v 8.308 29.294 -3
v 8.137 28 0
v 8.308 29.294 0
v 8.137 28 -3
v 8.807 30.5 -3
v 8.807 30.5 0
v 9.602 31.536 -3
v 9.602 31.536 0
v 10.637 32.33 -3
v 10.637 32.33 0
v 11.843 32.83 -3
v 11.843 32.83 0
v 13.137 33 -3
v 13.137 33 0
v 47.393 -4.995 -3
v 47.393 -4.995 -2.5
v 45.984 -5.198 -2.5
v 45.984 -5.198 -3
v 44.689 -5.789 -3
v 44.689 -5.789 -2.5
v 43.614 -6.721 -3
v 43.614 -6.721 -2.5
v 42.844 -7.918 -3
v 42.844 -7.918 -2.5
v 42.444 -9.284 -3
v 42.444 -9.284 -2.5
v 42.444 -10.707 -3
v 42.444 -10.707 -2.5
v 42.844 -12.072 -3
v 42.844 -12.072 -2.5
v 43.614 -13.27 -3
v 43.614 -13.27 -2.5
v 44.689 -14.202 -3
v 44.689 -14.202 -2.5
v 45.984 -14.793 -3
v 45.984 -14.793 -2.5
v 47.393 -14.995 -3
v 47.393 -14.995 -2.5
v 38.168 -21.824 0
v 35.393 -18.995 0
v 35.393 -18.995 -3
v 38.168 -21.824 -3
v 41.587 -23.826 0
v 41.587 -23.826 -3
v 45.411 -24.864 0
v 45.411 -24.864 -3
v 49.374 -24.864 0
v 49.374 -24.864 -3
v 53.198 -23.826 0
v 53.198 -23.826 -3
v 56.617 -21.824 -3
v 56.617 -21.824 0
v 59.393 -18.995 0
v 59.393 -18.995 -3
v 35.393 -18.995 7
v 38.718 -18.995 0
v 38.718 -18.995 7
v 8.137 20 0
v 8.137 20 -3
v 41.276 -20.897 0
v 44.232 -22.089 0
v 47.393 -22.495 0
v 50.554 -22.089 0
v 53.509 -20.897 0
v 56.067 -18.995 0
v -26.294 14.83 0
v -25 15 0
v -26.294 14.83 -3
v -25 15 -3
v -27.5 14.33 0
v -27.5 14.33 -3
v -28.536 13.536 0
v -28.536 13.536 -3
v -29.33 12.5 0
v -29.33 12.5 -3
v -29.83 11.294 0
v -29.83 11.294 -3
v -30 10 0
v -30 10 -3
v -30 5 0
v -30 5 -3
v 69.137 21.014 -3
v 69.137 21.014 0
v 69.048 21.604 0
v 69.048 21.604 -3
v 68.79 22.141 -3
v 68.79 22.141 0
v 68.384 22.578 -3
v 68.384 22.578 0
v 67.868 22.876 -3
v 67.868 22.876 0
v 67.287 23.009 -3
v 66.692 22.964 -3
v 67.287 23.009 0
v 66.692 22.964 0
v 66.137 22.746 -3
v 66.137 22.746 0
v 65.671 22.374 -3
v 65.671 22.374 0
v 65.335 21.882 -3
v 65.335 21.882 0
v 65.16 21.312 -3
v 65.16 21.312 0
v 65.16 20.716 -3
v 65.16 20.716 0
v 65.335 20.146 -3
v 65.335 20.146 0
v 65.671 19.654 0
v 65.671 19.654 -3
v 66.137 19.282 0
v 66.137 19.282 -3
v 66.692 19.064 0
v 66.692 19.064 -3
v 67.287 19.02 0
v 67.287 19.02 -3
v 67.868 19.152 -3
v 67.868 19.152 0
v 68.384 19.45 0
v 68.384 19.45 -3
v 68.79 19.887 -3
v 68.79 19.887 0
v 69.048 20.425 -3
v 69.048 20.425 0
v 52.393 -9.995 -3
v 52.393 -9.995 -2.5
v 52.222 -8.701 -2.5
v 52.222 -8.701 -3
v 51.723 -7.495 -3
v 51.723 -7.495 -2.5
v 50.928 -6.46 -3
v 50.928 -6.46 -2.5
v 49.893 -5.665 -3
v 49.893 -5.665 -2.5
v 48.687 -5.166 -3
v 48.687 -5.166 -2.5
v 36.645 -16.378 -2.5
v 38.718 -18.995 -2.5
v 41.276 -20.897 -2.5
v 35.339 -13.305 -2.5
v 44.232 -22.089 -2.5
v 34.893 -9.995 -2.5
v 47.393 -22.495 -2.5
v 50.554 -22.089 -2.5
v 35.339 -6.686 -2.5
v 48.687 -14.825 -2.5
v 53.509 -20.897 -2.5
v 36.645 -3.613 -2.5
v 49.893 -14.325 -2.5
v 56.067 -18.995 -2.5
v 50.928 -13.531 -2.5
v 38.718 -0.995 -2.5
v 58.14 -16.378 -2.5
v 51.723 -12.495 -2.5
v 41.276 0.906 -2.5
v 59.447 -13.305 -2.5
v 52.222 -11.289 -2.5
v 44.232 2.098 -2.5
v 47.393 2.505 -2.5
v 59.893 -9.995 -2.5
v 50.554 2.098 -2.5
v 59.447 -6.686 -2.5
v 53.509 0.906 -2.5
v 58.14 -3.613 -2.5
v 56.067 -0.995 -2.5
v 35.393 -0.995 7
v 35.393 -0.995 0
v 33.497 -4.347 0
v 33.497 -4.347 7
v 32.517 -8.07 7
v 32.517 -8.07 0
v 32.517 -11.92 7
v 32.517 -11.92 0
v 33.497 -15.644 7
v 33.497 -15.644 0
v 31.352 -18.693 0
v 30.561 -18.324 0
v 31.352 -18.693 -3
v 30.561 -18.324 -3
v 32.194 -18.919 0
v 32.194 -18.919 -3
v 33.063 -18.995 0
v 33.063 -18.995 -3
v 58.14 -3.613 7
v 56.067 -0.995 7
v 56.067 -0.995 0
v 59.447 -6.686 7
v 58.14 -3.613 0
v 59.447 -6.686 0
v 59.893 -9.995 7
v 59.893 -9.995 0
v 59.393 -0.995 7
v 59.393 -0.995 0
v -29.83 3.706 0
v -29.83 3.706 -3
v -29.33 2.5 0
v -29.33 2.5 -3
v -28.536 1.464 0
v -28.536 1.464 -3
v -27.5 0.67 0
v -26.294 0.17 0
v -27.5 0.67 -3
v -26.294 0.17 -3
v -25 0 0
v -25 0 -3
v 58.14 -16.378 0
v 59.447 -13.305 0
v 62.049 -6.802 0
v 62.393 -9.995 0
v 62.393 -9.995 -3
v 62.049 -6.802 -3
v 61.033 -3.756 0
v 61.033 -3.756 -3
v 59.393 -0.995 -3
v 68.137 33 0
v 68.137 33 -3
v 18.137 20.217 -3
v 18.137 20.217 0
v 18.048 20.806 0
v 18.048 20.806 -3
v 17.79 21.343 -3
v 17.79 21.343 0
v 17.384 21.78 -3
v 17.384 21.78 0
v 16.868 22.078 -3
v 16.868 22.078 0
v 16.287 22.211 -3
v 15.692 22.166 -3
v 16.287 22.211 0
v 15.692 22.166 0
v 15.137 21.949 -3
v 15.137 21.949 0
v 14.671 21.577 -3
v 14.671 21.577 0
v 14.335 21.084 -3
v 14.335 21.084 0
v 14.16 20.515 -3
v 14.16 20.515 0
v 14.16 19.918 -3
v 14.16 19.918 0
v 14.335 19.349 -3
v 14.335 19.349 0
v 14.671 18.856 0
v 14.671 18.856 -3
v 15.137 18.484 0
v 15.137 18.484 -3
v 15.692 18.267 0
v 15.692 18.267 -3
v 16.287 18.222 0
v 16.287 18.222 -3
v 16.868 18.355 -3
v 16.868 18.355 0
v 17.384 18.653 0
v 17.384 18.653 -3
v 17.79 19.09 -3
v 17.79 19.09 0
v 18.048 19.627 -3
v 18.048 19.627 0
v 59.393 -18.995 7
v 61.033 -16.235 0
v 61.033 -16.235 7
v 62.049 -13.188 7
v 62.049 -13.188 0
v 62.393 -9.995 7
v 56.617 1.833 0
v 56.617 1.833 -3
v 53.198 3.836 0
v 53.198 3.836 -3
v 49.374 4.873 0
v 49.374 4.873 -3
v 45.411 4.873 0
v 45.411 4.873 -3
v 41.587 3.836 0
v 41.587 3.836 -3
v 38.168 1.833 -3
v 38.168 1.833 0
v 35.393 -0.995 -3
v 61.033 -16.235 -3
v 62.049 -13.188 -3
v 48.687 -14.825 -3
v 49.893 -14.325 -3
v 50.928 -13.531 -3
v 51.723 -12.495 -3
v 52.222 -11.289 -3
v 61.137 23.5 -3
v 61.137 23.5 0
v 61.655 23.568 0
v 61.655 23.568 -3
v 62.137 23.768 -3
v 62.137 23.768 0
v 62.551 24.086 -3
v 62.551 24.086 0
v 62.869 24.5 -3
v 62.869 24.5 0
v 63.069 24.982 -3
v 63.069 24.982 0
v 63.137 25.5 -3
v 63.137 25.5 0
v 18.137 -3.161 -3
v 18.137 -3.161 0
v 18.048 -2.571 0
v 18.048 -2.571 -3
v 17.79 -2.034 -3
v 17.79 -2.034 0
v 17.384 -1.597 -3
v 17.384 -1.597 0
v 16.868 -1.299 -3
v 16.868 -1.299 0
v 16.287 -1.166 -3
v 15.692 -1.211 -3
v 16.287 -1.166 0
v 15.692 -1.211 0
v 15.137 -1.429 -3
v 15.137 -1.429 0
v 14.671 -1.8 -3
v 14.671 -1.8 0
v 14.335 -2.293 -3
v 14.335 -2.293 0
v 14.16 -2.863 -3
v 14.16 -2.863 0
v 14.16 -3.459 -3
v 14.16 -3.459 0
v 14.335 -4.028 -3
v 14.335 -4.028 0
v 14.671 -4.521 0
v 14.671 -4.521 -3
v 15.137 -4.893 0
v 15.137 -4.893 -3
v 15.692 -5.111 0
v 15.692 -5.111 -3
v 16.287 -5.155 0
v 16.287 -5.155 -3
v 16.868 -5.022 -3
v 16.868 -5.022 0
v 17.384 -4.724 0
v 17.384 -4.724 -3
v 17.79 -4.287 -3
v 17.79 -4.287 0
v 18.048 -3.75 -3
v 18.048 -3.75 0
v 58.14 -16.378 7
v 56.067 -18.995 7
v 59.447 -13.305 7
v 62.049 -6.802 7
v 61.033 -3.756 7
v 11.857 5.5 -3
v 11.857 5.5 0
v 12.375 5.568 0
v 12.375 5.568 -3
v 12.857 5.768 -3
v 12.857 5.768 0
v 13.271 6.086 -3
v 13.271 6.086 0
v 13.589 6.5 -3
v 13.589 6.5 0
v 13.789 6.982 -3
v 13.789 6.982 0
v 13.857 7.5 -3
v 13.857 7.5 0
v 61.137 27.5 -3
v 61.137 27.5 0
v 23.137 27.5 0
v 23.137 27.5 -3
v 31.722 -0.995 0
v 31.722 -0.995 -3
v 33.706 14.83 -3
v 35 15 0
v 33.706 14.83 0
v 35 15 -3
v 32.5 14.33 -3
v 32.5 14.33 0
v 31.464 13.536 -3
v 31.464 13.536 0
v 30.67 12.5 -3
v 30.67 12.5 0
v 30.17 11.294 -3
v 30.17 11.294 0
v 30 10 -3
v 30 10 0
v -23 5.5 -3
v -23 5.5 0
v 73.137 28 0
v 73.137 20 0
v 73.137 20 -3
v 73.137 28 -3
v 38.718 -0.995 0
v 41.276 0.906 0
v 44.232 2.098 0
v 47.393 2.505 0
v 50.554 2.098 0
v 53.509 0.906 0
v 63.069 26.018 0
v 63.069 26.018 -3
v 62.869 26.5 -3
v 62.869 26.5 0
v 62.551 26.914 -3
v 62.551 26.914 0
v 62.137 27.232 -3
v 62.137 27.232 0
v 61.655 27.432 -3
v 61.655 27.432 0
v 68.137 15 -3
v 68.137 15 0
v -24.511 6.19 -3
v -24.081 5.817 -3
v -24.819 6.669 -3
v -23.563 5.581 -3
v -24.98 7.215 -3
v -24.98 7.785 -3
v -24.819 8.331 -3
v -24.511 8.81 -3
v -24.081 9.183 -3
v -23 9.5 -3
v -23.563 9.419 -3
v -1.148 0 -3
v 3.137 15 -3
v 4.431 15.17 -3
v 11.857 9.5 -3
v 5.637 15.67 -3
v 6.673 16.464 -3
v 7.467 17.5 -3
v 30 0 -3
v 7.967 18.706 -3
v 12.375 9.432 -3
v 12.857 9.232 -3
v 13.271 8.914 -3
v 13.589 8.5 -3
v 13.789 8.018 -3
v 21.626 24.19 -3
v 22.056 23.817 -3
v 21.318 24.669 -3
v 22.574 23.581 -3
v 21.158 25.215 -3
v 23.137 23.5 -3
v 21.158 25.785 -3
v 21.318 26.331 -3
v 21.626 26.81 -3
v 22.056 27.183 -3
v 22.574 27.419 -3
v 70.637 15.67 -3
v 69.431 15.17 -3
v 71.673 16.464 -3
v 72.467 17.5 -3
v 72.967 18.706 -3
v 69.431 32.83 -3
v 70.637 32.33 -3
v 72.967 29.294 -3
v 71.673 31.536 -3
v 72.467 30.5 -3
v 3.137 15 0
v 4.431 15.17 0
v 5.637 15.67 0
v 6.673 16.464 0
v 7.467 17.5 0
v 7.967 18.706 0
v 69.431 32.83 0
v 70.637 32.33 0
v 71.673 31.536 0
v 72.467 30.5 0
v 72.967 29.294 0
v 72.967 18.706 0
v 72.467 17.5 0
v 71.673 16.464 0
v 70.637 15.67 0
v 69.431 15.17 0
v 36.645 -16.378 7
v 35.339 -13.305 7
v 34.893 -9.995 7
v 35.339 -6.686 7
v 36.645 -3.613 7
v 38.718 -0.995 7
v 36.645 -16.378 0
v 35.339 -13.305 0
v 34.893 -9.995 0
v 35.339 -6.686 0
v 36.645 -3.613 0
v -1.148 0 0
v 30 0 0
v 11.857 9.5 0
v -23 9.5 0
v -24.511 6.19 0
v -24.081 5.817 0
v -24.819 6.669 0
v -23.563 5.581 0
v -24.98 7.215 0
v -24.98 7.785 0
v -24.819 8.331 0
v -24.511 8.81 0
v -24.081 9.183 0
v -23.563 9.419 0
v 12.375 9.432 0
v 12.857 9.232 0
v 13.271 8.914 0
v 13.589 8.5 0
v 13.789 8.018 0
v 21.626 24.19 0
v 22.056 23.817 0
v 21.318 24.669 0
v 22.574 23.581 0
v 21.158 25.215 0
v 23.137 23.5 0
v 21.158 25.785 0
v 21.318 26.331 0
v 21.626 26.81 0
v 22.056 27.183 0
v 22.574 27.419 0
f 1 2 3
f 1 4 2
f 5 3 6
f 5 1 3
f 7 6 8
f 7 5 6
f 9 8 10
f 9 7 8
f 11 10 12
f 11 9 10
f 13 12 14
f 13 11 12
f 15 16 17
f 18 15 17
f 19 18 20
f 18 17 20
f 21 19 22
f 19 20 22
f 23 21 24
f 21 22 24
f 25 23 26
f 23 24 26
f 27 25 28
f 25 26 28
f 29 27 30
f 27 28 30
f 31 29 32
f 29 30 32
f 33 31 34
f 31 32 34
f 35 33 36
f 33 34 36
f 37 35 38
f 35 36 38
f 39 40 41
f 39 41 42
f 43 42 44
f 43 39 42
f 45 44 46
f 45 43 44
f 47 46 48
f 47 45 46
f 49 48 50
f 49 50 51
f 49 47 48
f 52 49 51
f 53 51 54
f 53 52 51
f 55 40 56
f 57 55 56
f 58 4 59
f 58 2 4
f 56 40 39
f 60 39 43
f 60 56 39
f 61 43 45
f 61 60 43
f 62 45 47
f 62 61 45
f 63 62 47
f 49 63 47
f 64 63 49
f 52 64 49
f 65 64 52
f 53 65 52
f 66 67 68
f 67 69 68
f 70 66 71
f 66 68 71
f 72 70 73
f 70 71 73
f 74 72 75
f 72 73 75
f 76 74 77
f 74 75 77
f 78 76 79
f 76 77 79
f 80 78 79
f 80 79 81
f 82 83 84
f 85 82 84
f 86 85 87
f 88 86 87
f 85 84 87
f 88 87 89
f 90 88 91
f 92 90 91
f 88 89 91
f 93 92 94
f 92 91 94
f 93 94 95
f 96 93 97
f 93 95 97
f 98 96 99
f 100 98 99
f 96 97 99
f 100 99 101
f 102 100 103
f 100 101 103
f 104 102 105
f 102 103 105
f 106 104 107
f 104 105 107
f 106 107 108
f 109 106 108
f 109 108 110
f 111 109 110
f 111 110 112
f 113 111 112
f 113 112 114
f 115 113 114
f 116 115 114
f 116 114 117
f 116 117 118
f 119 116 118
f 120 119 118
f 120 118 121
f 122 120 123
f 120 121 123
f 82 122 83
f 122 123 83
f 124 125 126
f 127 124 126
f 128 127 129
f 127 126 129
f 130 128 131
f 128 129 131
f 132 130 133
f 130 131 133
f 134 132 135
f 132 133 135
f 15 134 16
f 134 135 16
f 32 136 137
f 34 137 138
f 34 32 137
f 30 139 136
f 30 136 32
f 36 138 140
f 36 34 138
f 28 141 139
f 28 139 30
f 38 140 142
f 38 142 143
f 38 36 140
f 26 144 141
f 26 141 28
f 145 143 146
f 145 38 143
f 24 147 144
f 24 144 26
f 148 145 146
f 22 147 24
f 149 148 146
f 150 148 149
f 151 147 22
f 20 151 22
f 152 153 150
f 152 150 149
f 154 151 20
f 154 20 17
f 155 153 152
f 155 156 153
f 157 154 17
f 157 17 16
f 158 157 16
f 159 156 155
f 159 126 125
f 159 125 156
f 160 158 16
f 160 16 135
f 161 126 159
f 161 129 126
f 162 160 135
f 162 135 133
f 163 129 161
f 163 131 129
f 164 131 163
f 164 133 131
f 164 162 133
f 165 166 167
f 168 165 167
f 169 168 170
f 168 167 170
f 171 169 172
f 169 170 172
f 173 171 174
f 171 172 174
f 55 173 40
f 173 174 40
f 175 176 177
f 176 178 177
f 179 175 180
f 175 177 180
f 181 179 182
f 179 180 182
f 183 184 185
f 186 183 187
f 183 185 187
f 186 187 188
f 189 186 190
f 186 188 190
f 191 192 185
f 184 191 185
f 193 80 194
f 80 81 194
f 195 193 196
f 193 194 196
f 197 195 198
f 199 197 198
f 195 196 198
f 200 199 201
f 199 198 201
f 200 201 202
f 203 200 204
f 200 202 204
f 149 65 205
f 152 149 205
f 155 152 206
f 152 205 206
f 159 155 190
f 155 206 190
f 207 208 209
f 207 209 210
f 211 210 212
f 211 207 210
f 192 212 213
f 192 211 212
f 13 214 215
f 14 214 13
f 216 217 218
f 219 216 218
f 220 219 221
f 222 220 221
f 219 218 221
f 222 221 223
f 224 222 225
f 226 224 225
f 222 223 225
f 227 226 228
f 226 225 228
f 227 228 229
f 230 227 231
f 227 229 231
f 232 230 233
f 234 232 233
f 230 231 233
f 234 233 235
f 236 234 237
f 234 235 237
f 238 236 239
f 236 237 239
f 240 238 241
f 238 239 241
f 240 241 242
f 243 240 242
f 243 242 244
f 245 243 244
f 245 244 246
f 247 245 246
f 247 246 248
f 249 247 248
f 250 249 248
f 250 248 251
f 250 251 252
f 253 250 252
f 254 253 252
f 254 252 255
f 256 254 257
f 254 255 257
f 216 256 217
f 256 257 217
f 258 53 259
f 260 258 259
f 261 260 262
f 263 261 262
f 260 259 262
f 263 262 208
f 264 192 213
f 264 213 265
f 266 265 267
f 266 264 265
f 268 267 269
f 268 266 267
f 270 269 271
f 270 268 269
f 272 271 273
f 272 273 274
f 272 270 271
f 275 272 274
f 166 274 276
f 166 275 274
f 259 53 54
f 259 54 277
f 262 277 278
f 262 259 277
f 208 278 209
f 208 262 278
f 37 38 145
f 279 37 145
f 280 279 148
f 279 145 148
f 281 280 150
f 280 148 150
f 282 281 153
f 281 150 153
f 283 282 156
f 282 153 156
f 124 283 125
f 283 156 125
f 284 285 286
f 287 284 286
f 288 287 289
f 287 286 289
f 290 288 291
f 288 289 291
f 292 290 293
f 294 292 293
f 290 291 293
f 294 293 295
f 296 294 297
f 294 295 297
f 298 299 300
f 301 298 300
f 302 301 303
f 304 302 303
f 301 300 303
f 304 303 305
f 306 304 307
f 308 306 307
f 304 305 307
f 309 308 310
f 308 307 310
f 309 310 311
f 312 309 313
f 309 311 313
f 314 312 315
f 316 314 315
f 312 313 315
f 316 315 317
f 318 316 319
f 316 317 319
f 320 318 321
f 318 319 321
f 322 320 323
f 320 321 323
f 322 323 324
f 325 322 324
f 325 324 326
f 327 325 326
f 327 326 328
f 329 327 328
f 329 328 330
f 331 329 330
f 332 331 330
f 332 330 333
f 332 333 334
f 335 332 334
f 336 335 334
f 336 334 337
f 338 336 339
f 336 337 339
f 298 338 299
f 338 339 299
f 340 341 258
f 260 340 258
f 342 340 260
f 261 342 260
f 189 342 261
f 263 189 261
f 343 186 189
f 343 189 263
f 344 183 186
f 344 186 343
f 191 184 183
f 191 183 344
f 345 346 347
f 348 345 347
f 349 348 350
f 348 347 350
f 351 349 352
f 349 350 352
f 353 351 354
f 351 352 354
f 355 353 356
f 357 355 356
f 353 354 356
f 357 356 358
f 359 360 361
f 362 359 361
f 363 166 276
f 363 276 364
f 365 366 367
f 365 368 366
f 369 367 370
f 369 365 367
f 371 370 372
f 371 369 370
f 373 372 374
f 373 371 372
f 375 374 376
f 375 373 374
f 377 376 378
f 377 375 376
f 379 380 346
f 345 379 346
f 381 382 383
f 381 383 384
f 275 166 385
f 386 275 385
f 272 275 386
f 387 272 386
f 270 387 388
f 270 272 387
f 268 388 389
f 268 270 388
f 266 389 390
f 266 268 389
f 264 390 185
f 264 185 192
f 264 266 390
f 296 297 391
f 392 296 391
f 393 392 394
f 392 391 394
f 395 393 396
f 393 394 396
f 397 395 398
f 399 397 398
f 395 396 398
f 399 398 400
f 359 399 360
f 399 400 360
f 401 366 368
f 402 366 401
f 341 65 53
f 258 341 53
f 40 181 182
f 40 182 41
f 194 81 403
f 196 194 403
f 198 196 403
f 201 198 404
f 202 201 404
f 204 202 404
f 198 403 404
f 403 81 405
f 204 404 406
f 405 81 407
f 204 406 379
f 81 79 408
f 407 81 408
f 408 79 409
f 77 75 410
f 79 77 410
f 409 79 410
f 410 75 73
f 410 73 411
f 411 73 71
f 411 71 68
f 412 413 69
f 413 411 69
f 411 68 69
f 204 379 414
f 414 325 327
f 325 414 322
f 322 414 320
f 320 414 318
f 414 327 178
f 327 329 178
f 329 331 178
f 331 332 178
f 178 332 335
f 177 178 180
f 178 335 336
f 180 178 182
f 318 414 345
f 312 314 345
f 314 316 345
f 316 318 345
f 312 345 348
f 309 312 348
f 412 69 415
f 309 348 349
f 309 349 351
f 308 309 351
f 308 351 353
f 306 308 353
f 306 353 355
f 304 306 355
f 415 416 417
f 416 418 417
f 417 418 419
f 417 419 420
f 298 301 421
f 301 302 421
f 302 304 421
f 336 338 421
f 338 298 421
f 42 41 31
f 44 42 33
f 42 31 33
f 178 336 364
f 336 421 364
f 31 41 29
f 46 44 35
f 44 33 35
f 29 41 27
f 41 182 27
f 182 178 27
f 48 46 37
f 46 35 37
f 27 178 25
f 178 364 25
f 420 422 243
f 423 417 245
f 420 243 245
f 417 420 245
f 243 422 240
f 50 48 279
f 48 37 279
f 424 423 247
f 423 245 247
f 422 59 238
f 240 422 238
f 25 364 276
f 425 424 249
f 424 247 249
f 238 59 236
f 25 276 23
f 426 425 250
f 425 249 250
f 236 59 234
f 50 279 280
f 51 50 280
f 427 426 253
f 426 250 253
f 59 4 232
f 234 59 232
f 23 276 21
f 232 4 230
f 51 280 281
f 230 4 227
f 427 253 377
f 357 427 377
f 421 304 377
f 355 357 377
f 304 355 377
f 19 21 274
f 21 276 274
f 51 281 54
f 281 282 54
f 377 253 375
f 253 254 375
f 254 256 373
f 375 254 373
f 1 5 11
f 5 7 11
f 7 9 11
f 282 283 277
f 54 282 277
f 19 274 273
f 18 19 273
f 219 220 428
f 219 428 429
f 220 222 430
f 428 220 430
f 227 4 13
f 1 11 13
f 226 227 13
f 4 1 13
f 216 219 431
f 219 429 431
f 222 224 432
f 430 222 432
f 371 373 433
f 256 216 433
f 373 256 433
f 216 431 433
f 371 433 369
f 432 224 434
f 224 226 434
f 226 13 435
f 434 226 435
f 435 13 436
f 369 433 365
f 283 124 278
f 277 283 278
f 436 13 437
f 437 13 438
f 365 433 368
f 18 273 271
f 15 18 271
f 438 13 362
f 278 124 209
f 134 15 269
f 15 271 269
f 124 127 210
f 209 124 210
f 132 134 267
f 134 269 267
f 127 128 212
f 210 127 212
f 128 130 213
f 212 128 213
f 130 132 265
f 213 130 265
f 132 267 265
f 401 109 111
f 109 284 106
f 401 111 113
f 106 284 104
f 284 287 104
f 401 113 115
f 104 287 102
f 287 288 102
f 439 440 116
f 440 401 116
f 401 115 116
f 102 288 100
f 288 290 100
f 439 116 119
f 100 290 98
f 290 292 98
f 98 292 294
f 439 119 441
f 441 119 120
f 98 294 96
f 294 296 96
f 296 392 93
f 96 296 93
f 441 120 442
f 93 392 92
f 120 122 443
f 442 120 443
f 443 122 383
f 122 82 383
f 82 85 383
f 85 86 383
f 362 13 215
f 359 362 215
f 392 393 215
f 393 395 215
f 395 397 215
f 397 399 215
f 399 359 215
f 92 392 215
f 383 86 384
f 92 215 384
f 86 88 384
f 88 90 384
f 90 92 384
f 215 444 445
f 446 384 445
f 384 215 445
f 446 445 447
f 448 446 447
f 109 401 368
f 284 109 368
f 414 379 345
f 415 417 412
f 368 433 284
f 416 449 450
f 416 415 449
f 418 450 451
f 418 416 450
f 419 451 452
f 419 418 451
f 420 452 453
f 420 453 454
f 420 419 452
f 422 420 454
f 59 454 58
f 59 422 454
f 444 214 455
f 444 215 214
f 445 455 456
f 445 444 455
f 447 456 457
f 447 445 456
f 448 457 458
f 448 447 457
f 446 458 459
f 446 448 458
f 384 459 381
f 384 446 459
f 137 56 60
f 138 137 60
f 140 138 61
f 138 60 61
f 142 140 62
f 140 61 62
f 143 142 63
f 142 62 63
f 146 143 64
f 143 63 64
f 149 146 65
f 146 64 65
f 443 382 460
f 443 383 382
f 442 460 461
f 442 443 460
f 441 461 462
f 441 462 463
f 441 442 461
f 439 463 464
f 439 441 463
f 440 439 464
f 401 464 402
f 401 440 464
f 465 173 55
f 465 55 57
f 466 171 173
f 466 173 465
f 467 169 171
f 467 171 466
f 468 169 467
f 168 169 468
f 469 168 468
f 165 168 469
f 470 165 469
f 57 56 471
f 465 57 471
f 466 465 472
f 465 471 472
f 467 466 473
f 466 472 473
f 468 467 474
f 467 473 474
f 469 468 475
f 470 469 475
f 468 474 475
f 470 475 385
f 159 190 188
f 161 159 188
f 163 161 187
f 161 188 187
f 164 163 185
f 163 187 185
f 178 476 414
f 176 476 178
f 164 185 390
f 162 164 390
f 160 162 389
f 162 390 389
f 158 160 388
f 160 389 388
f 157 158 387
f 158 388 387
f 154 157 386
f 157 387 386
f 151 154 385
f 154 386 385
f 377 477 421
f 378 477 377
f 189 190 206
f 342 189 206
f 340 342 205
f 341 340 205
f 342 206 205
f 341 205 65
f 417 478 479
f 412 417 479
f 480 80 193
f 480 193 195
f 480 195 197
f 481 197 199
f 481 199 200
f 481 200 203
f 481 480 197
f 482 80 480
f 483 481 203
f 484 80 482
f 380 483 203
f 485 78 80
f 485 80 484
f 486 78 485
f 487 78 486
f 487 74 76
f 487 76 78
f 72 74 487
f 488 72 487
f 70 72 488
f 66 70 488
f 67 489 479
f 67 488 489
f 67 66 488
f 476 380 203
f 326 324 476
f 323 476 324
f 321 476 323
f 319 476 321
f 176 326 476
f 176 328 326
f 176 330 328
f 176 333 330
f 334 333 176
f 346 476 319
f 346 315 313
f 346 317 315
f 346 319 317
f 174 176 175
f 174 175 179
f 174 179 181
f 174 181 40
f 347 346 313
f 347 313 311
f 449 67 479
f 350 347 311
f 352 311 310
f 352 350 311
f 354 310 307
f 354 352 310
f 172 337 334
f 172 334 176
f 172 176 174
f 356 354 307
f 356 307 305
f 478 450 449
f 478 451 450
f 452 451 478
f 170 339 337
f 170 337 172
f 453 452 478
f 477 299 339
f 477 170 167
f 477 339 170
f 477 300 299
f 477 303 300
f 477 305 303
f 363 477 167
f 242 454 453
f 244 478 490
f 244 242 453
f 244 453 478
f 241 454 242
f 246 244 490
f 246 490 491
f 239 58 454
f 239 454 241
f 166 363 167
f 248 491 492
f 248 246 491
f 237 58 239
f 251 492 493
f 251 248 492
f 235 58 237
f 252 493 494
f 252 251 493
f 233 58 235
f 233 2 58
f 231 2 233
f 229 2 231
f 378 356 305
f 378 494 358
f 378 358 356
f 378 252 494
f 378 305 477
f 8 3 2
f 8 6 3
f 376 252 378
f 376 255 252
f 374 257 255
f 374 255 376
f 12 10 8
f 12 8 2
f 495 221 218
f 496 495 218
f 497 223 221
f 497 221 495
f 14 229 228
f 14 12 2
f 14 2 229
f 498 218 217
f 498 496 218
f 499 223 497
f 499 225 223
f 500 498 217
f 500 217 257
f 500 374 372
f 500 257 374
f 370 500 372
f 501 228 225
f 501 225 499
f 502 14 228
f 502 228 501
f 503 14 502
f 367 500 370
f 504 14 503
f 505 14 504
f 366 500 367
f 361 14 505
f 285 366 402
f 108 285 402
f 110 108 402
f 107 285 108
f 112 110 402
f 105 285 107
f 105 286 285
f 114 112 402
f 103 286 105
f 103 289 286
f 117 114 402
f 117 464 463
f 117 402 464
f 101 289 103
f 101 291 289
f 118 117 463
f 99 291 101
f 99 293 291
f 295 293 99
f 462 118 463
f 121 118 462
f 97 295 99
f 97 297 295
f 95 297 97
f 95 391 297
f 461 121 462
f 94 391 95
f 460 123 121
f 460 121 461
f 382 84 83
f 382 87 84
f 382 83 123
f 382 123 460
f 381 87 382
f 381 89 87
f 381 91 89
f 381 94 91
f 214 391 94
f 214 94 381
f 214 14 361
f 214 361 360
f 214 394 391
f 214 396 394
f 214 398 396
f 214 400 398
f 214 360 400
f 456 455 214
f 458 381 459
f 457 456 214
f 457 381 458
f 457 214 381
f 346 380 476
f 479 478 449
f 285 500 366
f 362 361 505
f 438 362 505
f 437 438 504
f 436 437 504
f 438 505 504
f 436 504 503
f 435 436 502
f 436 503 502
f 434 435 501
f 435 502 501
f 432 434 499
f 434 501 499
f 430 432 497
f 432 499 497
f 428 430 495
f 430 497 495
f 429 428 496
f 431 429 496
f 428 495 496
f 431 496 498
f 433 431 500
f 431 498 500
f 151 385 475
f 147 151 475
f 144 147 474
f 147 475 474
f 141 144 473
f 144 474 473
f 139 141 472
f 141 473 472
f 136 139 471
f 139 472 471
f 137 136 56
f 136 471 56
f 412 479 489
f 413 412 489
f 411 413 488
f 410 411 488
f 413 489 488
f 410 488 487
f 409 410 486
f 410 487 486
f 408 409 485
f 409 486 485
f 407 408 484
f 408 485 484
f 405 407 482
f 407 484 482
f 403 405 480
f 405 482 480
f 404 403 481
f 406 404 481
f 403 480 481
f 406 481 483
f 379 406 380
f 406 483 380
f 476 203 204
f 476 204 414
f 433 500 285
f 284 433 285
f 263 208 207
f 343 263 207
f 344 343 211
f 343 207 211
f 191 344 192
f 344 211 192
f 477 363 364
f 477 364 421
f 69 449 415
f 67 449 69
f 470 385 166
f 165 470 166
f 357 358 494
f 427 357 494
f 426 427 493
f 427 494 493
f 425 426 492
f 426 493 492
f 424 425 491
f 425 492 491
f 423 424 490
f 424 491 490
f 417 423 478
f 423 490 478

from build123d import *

# Parameters (mm, degrees)
F0_R     = 2
F0_W     = 21.8627425395
F0_H     = 3
F2_DEPTH = 3
F3_DEPTH = 2.5
F4_DEPTH = 3.001
F5_DEPTH = 3
F6_R     = 5
F7_DEPTH = 7


with BuildPart() as f2:
    # F0 (on Top) → F2 (new body)
    with BuildSketch(Plane.XY):
        Polygon((8.1372574605, 15), (-30, 15), (-30, 0), (-1.1483471663, 0), (30, 0), (30, 15), align=None)
        with BuildLine():
            ThreePointArc((-23, 5.5), (-25, 7.5), (-23, 9.5))
            Line((-23, 9.5), (11.8569275364, 9.5))
            ThreePointArc((11.8569275364, 9.5), (13.2711410988, 8.9142135624), (13.8569275364, 7.5))
            ThreePointArc((13.8569275364, 7.5), (13.2711410988, 6.0857864376), (11.8569275364, 5.5))
            Line((11.8569275364, 5.5), (-23, 5.5))
        make_face(mode=Mode.SUBTRACT)
        Polygon((30, 0), (-1.1483471663, 0), (31.7223609335, -18.9953175569), (31.7223609335, -0.9953175569), align=None)
        with Locations((16.1372574605, -3.1607300043)):
            Circle(F0_R, mode=Mode.SUBTRACT)
        with BuildLine():
            Line((8.1372574605, 33), (8.1372574605, 18))
            Line((8.1372574605, 18), (30, 18))
            Line((30, 18), (40.6372574605, 18))
            Line((40.6372574605, 18), (40.6372574605, 23.5))
            Line((40.6372574605, 23.5), (23.1372574605, 23.5))
            ThreePointArc((23.1372574605, 23.5), (21.1372574605, 25.5), (23.1372574605, 27.5))
            Line((23.1372574605, 27.5), (40.6372574605, 27.5))
            Line((40.6372574605, 27.5), (40.6372574605, 33))
            Line((40.6372574605, 33), (8.1372574605, 33))
        make_face()
        with Locations((16.1372574605, 20.216524601)):
            Circle(F0_R, mode=Mode.SUBTRACT)
        with BuildLine():
            Line((40.6372574605, 23.5), (40.6372574605, 18))
            Line((40.6372574605, 18), (73.1372574605, 18))
            Line((73.1372574605, 18), (73.1372574605, 33))
            Line((73.1372574605, 33), (40.6372574605, 33))
            Line((40.6372574605, 33), (40.6372574605, 27.5))
            Line((40.6372574605, 27.5), (61.1372574605, 27.5))
            ThreePointArc((61.1372574605, 27.5), (62.5514710229, 26.9142135624), (63.1372574605, 25.5))
            ThreePointArc((63.1372574605, 25.5), (62.5514710229, 24.0857864376), (61.1372574605, 23.5))
            Line((61.1372574605, 23.5), (40.6372574605, 23.5))
        make_face()
        with Locations((67.1372574605, 21.0141353309)):
            Circle(F0_R, mode=Mode.SUBTRACT)
        with Locations((19.0686287303, 16.5)):
            Rectangle(F0_W, F0_H)
        with BuildLine():
            Line((31.7223609335, -0.9953175569), (31.7223609335, -18.9953175569))
            Line((31.7223609335, -18.9953175569), (35.3926290005, -18.9953175569))
            ThreePointArc((35.3926290005, -18.9953175569), (32.3926290005, -9.9953175569), (35.3926290005, -0.9953175569))
            Line((35.3926290005, -0.9953175569), (31.7223609335, -0.9953175569))
        make_face()
        with BuildLine():
            ThreePointArc((35.3926290005, -0.9953175569), (32.3926290005, -9.9953175569), (35.3926290005, -18.9953175569))
            Line((35.3926290005, -18.9953175569), (38.717953214, -18.9953175569))
            ThreePointArc((38.717953214, -18.9953175569), (34.8926290005, -9.9953175569), (38.717953214, -0.9953175569))
            Line((38.717953214, -0.9953175569), (35.3926290005, -0.9953175569))
        make_face()
        with BuildLine():
            ThreePointArc((38.717953214, -0.9953175569), (34.8926290005, -9.9953175569), (38.717953214, -18.9953175569))
            Line((38.717953214, -18.9953175569), (47.3926290005, -18.9953175569))
            Line((47.3926290005, -18.9953175569), (47.3926290005, -0.9953175569))
            Line((47.3926290005, -0.9953175569), (38.717953214, -0.9953175569))
        make_face()
        with BuildLine():
            ThreePointArc((56.0673047869, -0.9953175569), (47.3926290005, 2.5046824431), (38.717953214, -0.9953175569))
            Line((38.717953214, -0.9953175569), (47.3926290005, -0.9953175569))
            Line((47.3926290005, -0.9953175569), (56.0673047869, -0.9953175569))
        make_face()
        with BuildLine():
            Line((47.3926290005, -18.9953175569), (56.0673047869, -18.9953175569))
            ThreePointArc((56.0673047869, -18.9953175569), (58.8966162947, -14.8849265734), (59.8926290005, -9.9953175569))
            ThreePointArc((59.8926290005, -9.9953175569), (58.8966162947, -5.1057085403), (56.0673047869, -0.9953175569))
            Line((56.0673047869, -0.9953175569), (47.3926290005, -0.9953175569))
            Line((47.3926290005, -0.9953175569), (47.3926290005, -18.9953175569))
        make_face()
        with BuildLine():
            Line((56.0673047869, -18.9953175569), (59.3926290005, -18.9953175569))
            ThreePointArc((59.3926290005, -18.9953175569), (61.6228784712, -14.7387340471), (62.3926290005, -9.9953175569))
            ThreePointArc((62.3926290005, -9.9953175569), (61.6228784712, -5.2519010666), (59.3926290005, -0.9953175569))
            Line((59.3926290005, -0.9953175569), (56.0673047869, -0.9953175569))
            ThreePointArc((56.0673047869, -0.9953175569), (58.8966162947, -5.1057085403), (59.8926290005, -9.9953175569))
            ThreePointArc((59.8926290005, -9.9953175569), (58.8966162947, -14.8849265734), (56.0673047869, -18.9953175569))
        make_face()
        with BuildLine():
            Line((38.717953214, -18.9953175569), (35.3926290005, -18.9953175569))
            ThreePointArc((35.3926290005, -18.9953175569), (47.3926290005, -24.9953175569), (59.3926290005, -18.9953175569))
            Line((59.3926290005, -18.9953175569), (56.0673047869, -18.9953175569))
            ThreePointArc((56.0673047869, -18.9953175569), (47.3926290005, -22.4953175569), (38.717953214, -18.9953175569))
        make_face()
        with BuildLine():
            Line((47.3926290005, -18.9953175569), (38.717953214, -18.9953175569))
            ThreePointArc((38.717953214, -18.9953175569), (47.3926290005, -22.4953175569), (56.0673047869, -18.9953175569))
            Line((56.0673047869, -18.9953175569), (47.3926290005, -18.9953175569))
        make_face()
        with BuildLine():
            ThreePointArc((59.3926290005, -0.9953175569), (47.3926290005, 5.0046824431), (35.3926290005, -0.9953175569))
            Line((35.3926290005, -0.9953175569), (38.717953214, -0.9953175569))
            ThreePointArc((38.717953214, -0.9953175569), (47.3926290005, 2.5046824431), (56.0673047869, -0.9953175569))
            Line((56.0673047869, -0.9953175569), (59.3926290005, -0.9953175569))
        make_face()
        with BuildLine():
            ThreePointArc((-23, 9.5), (-21.5857864376, 8.9142135624), (-21, 7.5))
            ThreePointArc((-21, 7.5), (-21.5857864376, 6.0857864376), (-23, 5.5))
            Line((-23, 5.5), (11.8569275364, 5.5))
            ThreePointArc((11.8569275364, 5.5), (9.8569275364, 7.5), (11.8569275364, 9.5))
            Line((11.8569275364, 9.5), (-23, 9.5))
        make_face()
        with BuildLine():
            Line((11.8569275364, 7.5), (11.8569275364, 9.5))
            ThreePointArc((11.8569275364, 9.5), (9.8569275364, 7.5), (11.8569275364, 5.5))
            Line((11.8569275364, 5.5), (11.8569275364, 7.5))
        make_face()
        with BuildLine():
            ThreePointArc((13.8569275364, 7.5), (13.2711410988, 8.9142135624), (11.8569275364, 9.5))
            Line((11.8569275364, 9.5), (11.8569275364, 7.5))
            Line((11.8569275364, 7.5), (11.8569275364, 5.5))
            ThreePointArc((11.8569275364, 5.5), (13.2711410988, 6.0857864376), (13.8569275364, 7.5))
        make_face()
        with BuildLine():
            Line((-23, 7.5), (-23, 9.5))
            ThreePointArc((-23, 9.5), (-25, 7.5), (-23, 5.5))
            Line((-23, 5.5), (-23, 7.5))
        make_face()
        with BuildLine():
            ThreePointArc((-23, 5.5), (-21.5857864376, 6.0857864376), (-21, 7.5))
            ThreePointArc((-21, 7.5), (-21.5857864376, 8.9142135624), (-23, 9.5))
            Line((-23, 9.5), (-23, 7.5))
            Line((-23, 7.5), (-23, 5.5))
        make_face()
        with BuildLine():
            ThreePointArc((23.1372574605, 27.5), (21.1372574605, 25.5), (23.1372574605, 23.5))
            Line((23.1372574605, 23.5), (23.1372574605, 25.5))
            Line((23.1372574605, 25.5), (23.1372574605, 27.5))
        make_face()
        with BuildLine():
            Line((23.1372574605, 25.5), (23.1372574605, 23.5))
            ThreePointArc((23.1372574605, 23.5), (24.5514710229, 24.0857864376), (25.1372574605, 25.5))
            ThreePointArc((25.1372574605, 25.5), (24.5514710229, 26.9142135624), (23.1372574605, 27.5))
            Line((23.1372574605, 27.5), (23.1372574605, 25.5))
        make_face()
        with BuildLine():
            Line((23.1372574605, 23.5), (40.6372574605, 23.5))
            Line((40.6372574605, 23.5), (40.6372574605, 25.5))
            Line((40.6372574605, 25.5), (40.6372574605, 27.5))
            Line((40.6372574605, 27.5), (23.1372574605, 27.5))
            ThreePointArc((23.1372574605, 27.5), (24.5514710229, 26.9142135624), (25.1372574605, 25.5))
            ThreePointArc((25.1372574605, 25.5), (24.5514710229, 24.0857864376), (23.1372574605, 23.5))
        make_face()
        with BuildLine():
            Line((40.6372574605, 25.5), (40.6372574605, 23.5))
            Line((40.6372574605, 23.5), (61.1372574605, 23.5))
            ThreePointArc((61.1372574605, 23.5), (59.1372574605, 25.5), (61.1372574605, 27.5))
            Line((61.1372574605, 27.5), (40.6372574605, 27.5))
            Line((40.6372574605, 27.5), (40.6372574605, 25.5))
        make_face()
        with BuildLine():
            ThreePointArc((61.1372574605, 27.5), (59.1372574605, 25.5), (61.1372574605, 23.5))
            Line((61.1372574605, 23.5), (61.1372574605, 25.5))
            Line((61.1372574605, 25.5), (61.1372574605, 27.5))
        make_face()
        with BuildLine():
            Line((61.1372574605, 25.5), (61.1372574605, 23.5))
            ThreePointArc((61.1372574605, 23.5), (62.5514710229, 24.0857864376), (63.1372574605, 25.5))
            ThreePointArc((63.1372574605, 25.5), (62.5514710229, 26.9142135624), (61.1372574605, 27.5))
            Line((61.1372574605, 27.5), (61.1372574605, 25.5))
        make_face()
        Polygon((30, 18), (30, 15), (73.1372574605, 15), (73.1372574605, 18), (40.6372574605, 18), align=None)
    extrude(amount=-F2_DEPTH)

    # F0 (on Top) → F3 (cut)
    with BuildSketch(Plane.XY):
        with BuildLine():
            ThreePointArc((56.0673047869, -0.9953175569), (47.3926290005, 2.5046824431), (38.717953214, -0.9953175569))
            Line((38.717953214, -0.9953175569), (47.3926290005, -0.9953175569))
            Line((47.3926290005, -0.9953175569), (56.0673047869, -0.9953175569))
        make_face()
        with BuildLine():
            ThreePointArc((38.717953214, -0.9953175569), (34.8926290005, -9.9953175569), (38.717953214, -18.9953175569))
            Line((38.717953214, -18.9953175569), (47.3926290005, -18.9953175569))
            Line((47.3926290005, -18.9953175569), (47.3926290005, -0.9953175569))
            Line((47.3926290005, -0.9953175569), (38.717953214, -0.9953175569))
        make_face()
        with BuildLine():
            Line((47.3926290005, -18.9953175569), (56.0673047869, -18.9953175569))
            ThreePointArc((56.0673047869, -18.9953175569), (58.8966162947, -14.8849265734), (59.8926290005, -9.9953175569))
            ThreePointArc((59.8926290005, -9.9953175569), (58.8966162947, -5.1057085403), (56.0673047869, -0.9953175569))
            Line((56.0673047869, -0.9953175569), (47.3926290005, -0.9953175569))
            Line((47.3926290005, -0.9953175569), (47.3926290005, -18.9953175569))
        make_face()
        with BuildLine():
            Line((47.3926290005, -18.9953175569), (38.717953214, -18.9953175569))
            ThreePointArc((38.717953214, -18.9953175569), (47.3926290005, -22.4953175569), (56.0673047869, -18.9953175569))
            Line((56.0673047869, -18.9953175569), (47.3926290005, -18.9953175569))
        make_face()
    extrude(amount=-F3_DEPTH, mode=Mode.SUBTRACT)

    # F1 (on face) → F4 (cut, through all)
    with BuildSketch(Plane.XY):
        with BuildLine():
            Line((47.3926290005, -14.9953175569), (47.3926290005, -4.9953175569))
            ThreePointArc((47.3926290005, -4.9953175569), (42.3926290005, -9.9953175569), (47.3926290005, -14.9953175569))
        make_face()
        with BuildLine():
            ThreePointArc((47.3926290005, -14.9953175569), (50.9281629064, -13.5308514628), (52.3926290005, -9.9953175569))
            ThreePointArc((52.3926290005, -9.9953175569), (50.9281629064, -6.459783651), (47.3926290005, -4.9953175569))
            Line((47.3926290005, -4.9953175569), (47.3926290005, -14.9953175569))
        make_face()
    extrude(amount=-F4_DEPTH, mode=Mode.SUBTRACT)

    # F0 (on Top) → F5 (cut, through all)
    with BuildSketch(Plane.XY):
        with BuildLine():
            ThreePointArc((23.1372574605, 27.5), (21.1372574605, 25.5), (23.1372574605, 23.5))
            Line((23.1372574605, 23.5), (23.1372574605, 25.5))
            Line((23.1372574605, 25.5), (23.1372574605, 27.5))
        make_face()
        with BuildLine():
            Line((23.1372574605, 25.5), (23.1372574605, 23.5))
            ThreePointArc((23.1372574605, 23.5), (24.5514710229, 24.0857864376), (25.1372574605, 25.5))
            ThreePointArc((25.1372574605, 25.5), (24.5514710229, 26.9142135624), (23.1372574605, 27.5))
            Line((23.1372574605, 27.5), (23.1372574605, 25.5))
        make_face()
        with BuildLine():
            Line((23.1372574605, 23.5), (40.6372574605, 23.5))
            Line((40.6372574605, 23.5), (40.6372574605, 25.5))
            Line((40.6372574605, 25.5), (40.6372574605, 27.5))
            Line((40.6372574605, 27.5), (23.1372574605, 27.5))
            ThreePointArc((23.1372574605, 27.5), (24.5514710229, 26.9142135624), (25.1372574605, 25.5))
            ThreePointArc((25.1372574605, 25.5), (24.5514710229, 24.0857864376), (23.1372574605, 23.5))
        make_face()
        with BuildLine():
            Line((40.6372574605, 25.5), (40.6372574605, 23.5))
            Line((40.6372574605, 23.5), (61.1372574605, 23.5))
            ThreePointArc((61.1372574605, 23.5), (59.1372574605, 25.5), (61.1372574605, 27.5))
            Line((61.1372574605, 27.5), (40.6372574605, 27.5))
            Line((40.6372574605, 27.5), (40.6372574605, 25.5))
        make_face()
        with BuildLine():
            ThreePointArc((61.1372574605, 27.5), (59.1372574605, 25.5), (61.1372574605, 23.5))
            Line((61.1372574605, 23.5), (61.1372574605, 25.5))
            Line((61.1372574605, 25.5), (61.1372574605, 27.5))
        make_face()
        with BuildLine():
            Line((61.1372574605, 25.5), (61.1372574605, 23.5))
            ThreePointArc((61.1372574605, 23.5), (62.5514710229, 24.0857864376), (63.1372574605, 25.5))
            ThreePointArc((63.1372574605, 25.5), (62.5514710229, 26.9142135624), (61.1372574605, 27.5))
            Line((61.1372574605, 27.5), (61.1372574605, 25.5))
        make_face()
        with BuildLine():
            ThreePointArc((13.8569275364, 7.5), (13.2711410988, 8.9142135624), (11.8569275364, 9.5))
            Line((11.8569275364, 9.5), (11.8569275364, 7.5))
            Line((11.8569275364, 7.5), (11.8569275364, 5.5))
            ThreePointArc((11.8569275364, 5.5), (13.2711410988, 6.0857864376), (13.8569275364, 7.5))
        make_face()
        with BuildLine():
            Line((11.8569275364, 7.5), (11.8569275364, 9.5))
            ThreePointArc((11.8569275364, 9.5), (9.8569275364, 7.5), (11.8569275364, 5.5))
            Line((11.8569275364, 5.5), (11.8569275364, 7.5))
        make_face()
        with BuildLine():
            ThreePointArc((-23, 9.5), (-21.5857864376, 8.9142135624), (-21, 7.5))
            ThreePointArc((-21, 7.5), (-21.5857864376, 6.0857864376), (-23, 5.5))
            Line((-23, 5.5), (11.8569275364, 5.5))
            ThreePointArc((11.8569275364, 5.5), (9.8569275364, 7.5), (11.8569275364, 9.5))
            Line((11.8569275364, 9.5), (-23, 9.5))
        make_face()
        with BuildLine():
            ThreePointArc((-23, 5.5), (-21.5857864376, 6.0857864376), (-21, 7.5))
            ThreePointArc((-21, 7.5), (-21.5857864376, 8.9142135624), (-23, 9.5))
            Line((-23, 9.5), (-23, 7.5))
            Line((-23, 7.5), (-23, 5.5))
        make_face()
        with BuildLine():
            Line((-23, 7.5), (-23, 9.5))
            ThreePointArc((-23, 9.5), (-25, 7.5), (-23, 5.5))
            Line((-23, 5.5), (-23, 7.5))
        make_face()
    extrude(amount=-F5_DEPTH, mode=Mode.SUBTRACT)

    # F6
    f6_edges = [f2.edges().sort_by_distance(p)[0] for p in [
        (8.137257, 33, -1.5),
        (-30, 15, -1.5),
        (-30, 0, -1.5),
        (31.722361, -18.995318, -1.5),
        (73.137257, 33, -1.5),
        (73.137257, 15, -1.5),
        (30, 15, -1.5),
        (8.137257, 15, -1.5),
    ]]
    fillet(f6_edges, radius=F6_R)

    # F0 (on Top) → F7 (join)
    with BuildSketch(Plane.XY):
        with BuildLine():
            Line((56.0673047869, -18.9953175569), (59.3926290005, -18.9953175569))
            ThreePointArc((59.3926290005, -18.9953175569), (61.6228784712, -14.7387340471), (62.3926290005, -9.9953175569))
            ThreePointArc((62.3926290005, -9.9953175569), (61.6228784712, -5.2519010666), (59.3926290005, -0.9953175569))
            Line((59.3926290005, -0.9953175569), (56.0673047869, -0.9953175569))
            ThreePointArc((56.0673047869, -0.9953175569), (58.8966162947, -5.1057085403), (59.8926290005, -9.9953175569))
            ThreePointArc((59.8926290005, -9.9953175569), (58.8966162947, -14.8849265734), (56.0673047869, -18.9953175569))
        make_face()
        with BuildLine():
            ThreePointArc((35.3926290005, -0.9953175569), (32.3926290005, -9.9953175569), (35.3926290005, -18.9953175569))
            Line((35.3926290005, -18.9953175569), (38.717953214, -18.9953175569))
            ThreePointArc((38.717953214, -18.9953175569), (34.8926290005, -9.9953175569), (38.717953214, -0.9953175569))
            Line((38.717953214, -0.9953175569), (35.3926290005, -0.9953175569))
        make_face()
    extrude(amount=F7_DEPTH)


solid = f2.part
